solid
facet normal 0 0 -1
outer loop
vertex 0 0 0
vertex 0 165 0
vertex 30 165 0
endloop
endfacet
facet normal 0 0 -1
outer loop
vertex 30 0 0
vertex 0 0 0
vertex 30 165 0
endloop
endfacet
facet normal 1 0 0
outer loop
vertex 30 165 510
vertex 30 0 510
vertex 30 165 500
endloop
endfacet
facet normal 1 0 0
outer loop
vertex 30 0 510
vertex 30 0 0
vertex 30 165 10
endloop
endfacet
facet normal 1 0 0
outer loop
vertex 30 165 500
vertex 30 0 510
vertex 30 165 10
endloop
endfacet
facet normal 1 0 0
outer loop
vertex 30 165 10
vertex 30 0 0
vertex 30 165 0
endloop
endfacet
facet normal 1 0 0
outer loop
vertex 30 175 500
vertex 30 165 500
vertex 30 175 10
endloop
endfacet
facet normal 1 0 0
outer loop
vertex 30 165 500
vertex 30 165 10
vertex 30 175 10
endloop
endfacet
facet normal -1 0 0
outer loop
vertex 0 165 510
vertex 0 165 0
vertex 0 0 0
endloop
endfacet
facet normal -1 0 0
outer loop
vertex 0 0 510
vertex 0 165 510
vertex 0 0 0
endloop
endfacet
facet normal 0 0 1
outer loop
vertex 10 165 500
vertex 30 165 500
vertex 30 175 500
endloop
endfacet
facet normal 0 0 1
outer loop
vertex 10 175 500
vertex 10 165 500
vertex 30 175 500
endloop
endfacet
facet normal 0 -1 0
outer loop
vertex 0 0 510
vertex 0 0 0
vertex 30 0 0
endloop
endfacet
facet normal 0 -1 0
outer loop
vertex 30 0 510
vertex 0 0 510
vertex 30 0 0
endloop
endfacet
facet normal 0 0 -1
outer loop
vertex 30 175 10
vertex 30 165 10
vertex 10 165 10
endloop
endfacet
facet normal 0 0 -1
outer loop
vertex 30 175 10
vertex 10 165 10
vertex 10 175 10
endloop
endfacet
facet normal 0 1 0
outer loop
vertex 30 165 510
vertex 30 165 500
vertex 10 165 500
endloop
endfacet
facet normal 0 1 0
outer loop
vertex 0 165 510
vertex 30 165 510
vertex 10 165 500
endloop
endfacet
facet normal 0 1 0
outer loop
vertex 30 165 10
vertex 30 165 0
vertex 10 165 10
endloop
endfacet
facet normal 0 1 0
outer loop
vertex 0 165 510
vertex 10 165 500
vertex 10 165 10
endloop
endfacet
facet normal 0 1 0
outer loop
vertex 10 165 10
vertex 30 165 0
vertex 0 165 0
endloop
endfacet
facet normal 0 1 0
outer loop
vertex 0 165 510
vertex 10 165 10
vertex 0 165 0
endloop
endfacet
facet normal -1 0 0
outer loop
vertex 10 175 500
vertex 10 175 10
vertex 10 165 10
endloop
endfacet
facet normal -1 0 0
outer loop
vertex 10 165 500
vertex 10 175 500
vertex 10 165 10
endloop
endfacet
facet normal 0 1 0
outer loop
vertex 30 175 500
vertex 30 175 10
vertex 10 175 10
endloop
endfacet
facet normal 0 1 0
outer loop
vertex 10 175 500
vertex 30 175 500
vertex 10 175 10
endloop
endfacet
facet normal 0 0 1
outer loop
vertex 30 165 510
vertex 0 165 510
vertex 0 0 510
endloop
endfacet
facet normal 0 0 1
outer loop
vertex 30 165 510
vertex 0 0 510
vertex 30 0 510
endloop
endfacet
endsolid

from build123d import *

# Parameters (mm, degrees)
EXTRUDE_1_DEPTH     = 510
SKETCH_2_W          = 10
SKETCH_2_H          = 10
CUT_EXTRUDE_1_DEPTH = 541.023147652


with BuildPart() as part:
    # Эскиз1 → Бобышка-Вытянуть1 (new body)
    with BuildSketch(Plane.XY):
        Polygon((0, 0), (10, 0), (30, 0), (30, 175), (10, 175), (10, 165), (0, 165), align=None)
    extrude(amount=EXTRUDE_1_DEPTH)

    # Эскиз2 → Вырез-Вытянуть1 (cut, through all)
    with BuildSketch(Plane(origin=(30, 0, 0), x_dir=(0, 0, -1), z_dir=(1, 0, 0))):
        with Locations((-5, 170)):
            Rectangle(SKETCH_2_W, SKETCH_2_H)
        with Locations((-505, 170)):
            Rectangle(SKETCH_2_W, SKETCH_2_H)
    extrude(amount=-CUT_EXTRUDE_1_DEPTH, mode=Mode.SUBTRACT)


solid = part.part
